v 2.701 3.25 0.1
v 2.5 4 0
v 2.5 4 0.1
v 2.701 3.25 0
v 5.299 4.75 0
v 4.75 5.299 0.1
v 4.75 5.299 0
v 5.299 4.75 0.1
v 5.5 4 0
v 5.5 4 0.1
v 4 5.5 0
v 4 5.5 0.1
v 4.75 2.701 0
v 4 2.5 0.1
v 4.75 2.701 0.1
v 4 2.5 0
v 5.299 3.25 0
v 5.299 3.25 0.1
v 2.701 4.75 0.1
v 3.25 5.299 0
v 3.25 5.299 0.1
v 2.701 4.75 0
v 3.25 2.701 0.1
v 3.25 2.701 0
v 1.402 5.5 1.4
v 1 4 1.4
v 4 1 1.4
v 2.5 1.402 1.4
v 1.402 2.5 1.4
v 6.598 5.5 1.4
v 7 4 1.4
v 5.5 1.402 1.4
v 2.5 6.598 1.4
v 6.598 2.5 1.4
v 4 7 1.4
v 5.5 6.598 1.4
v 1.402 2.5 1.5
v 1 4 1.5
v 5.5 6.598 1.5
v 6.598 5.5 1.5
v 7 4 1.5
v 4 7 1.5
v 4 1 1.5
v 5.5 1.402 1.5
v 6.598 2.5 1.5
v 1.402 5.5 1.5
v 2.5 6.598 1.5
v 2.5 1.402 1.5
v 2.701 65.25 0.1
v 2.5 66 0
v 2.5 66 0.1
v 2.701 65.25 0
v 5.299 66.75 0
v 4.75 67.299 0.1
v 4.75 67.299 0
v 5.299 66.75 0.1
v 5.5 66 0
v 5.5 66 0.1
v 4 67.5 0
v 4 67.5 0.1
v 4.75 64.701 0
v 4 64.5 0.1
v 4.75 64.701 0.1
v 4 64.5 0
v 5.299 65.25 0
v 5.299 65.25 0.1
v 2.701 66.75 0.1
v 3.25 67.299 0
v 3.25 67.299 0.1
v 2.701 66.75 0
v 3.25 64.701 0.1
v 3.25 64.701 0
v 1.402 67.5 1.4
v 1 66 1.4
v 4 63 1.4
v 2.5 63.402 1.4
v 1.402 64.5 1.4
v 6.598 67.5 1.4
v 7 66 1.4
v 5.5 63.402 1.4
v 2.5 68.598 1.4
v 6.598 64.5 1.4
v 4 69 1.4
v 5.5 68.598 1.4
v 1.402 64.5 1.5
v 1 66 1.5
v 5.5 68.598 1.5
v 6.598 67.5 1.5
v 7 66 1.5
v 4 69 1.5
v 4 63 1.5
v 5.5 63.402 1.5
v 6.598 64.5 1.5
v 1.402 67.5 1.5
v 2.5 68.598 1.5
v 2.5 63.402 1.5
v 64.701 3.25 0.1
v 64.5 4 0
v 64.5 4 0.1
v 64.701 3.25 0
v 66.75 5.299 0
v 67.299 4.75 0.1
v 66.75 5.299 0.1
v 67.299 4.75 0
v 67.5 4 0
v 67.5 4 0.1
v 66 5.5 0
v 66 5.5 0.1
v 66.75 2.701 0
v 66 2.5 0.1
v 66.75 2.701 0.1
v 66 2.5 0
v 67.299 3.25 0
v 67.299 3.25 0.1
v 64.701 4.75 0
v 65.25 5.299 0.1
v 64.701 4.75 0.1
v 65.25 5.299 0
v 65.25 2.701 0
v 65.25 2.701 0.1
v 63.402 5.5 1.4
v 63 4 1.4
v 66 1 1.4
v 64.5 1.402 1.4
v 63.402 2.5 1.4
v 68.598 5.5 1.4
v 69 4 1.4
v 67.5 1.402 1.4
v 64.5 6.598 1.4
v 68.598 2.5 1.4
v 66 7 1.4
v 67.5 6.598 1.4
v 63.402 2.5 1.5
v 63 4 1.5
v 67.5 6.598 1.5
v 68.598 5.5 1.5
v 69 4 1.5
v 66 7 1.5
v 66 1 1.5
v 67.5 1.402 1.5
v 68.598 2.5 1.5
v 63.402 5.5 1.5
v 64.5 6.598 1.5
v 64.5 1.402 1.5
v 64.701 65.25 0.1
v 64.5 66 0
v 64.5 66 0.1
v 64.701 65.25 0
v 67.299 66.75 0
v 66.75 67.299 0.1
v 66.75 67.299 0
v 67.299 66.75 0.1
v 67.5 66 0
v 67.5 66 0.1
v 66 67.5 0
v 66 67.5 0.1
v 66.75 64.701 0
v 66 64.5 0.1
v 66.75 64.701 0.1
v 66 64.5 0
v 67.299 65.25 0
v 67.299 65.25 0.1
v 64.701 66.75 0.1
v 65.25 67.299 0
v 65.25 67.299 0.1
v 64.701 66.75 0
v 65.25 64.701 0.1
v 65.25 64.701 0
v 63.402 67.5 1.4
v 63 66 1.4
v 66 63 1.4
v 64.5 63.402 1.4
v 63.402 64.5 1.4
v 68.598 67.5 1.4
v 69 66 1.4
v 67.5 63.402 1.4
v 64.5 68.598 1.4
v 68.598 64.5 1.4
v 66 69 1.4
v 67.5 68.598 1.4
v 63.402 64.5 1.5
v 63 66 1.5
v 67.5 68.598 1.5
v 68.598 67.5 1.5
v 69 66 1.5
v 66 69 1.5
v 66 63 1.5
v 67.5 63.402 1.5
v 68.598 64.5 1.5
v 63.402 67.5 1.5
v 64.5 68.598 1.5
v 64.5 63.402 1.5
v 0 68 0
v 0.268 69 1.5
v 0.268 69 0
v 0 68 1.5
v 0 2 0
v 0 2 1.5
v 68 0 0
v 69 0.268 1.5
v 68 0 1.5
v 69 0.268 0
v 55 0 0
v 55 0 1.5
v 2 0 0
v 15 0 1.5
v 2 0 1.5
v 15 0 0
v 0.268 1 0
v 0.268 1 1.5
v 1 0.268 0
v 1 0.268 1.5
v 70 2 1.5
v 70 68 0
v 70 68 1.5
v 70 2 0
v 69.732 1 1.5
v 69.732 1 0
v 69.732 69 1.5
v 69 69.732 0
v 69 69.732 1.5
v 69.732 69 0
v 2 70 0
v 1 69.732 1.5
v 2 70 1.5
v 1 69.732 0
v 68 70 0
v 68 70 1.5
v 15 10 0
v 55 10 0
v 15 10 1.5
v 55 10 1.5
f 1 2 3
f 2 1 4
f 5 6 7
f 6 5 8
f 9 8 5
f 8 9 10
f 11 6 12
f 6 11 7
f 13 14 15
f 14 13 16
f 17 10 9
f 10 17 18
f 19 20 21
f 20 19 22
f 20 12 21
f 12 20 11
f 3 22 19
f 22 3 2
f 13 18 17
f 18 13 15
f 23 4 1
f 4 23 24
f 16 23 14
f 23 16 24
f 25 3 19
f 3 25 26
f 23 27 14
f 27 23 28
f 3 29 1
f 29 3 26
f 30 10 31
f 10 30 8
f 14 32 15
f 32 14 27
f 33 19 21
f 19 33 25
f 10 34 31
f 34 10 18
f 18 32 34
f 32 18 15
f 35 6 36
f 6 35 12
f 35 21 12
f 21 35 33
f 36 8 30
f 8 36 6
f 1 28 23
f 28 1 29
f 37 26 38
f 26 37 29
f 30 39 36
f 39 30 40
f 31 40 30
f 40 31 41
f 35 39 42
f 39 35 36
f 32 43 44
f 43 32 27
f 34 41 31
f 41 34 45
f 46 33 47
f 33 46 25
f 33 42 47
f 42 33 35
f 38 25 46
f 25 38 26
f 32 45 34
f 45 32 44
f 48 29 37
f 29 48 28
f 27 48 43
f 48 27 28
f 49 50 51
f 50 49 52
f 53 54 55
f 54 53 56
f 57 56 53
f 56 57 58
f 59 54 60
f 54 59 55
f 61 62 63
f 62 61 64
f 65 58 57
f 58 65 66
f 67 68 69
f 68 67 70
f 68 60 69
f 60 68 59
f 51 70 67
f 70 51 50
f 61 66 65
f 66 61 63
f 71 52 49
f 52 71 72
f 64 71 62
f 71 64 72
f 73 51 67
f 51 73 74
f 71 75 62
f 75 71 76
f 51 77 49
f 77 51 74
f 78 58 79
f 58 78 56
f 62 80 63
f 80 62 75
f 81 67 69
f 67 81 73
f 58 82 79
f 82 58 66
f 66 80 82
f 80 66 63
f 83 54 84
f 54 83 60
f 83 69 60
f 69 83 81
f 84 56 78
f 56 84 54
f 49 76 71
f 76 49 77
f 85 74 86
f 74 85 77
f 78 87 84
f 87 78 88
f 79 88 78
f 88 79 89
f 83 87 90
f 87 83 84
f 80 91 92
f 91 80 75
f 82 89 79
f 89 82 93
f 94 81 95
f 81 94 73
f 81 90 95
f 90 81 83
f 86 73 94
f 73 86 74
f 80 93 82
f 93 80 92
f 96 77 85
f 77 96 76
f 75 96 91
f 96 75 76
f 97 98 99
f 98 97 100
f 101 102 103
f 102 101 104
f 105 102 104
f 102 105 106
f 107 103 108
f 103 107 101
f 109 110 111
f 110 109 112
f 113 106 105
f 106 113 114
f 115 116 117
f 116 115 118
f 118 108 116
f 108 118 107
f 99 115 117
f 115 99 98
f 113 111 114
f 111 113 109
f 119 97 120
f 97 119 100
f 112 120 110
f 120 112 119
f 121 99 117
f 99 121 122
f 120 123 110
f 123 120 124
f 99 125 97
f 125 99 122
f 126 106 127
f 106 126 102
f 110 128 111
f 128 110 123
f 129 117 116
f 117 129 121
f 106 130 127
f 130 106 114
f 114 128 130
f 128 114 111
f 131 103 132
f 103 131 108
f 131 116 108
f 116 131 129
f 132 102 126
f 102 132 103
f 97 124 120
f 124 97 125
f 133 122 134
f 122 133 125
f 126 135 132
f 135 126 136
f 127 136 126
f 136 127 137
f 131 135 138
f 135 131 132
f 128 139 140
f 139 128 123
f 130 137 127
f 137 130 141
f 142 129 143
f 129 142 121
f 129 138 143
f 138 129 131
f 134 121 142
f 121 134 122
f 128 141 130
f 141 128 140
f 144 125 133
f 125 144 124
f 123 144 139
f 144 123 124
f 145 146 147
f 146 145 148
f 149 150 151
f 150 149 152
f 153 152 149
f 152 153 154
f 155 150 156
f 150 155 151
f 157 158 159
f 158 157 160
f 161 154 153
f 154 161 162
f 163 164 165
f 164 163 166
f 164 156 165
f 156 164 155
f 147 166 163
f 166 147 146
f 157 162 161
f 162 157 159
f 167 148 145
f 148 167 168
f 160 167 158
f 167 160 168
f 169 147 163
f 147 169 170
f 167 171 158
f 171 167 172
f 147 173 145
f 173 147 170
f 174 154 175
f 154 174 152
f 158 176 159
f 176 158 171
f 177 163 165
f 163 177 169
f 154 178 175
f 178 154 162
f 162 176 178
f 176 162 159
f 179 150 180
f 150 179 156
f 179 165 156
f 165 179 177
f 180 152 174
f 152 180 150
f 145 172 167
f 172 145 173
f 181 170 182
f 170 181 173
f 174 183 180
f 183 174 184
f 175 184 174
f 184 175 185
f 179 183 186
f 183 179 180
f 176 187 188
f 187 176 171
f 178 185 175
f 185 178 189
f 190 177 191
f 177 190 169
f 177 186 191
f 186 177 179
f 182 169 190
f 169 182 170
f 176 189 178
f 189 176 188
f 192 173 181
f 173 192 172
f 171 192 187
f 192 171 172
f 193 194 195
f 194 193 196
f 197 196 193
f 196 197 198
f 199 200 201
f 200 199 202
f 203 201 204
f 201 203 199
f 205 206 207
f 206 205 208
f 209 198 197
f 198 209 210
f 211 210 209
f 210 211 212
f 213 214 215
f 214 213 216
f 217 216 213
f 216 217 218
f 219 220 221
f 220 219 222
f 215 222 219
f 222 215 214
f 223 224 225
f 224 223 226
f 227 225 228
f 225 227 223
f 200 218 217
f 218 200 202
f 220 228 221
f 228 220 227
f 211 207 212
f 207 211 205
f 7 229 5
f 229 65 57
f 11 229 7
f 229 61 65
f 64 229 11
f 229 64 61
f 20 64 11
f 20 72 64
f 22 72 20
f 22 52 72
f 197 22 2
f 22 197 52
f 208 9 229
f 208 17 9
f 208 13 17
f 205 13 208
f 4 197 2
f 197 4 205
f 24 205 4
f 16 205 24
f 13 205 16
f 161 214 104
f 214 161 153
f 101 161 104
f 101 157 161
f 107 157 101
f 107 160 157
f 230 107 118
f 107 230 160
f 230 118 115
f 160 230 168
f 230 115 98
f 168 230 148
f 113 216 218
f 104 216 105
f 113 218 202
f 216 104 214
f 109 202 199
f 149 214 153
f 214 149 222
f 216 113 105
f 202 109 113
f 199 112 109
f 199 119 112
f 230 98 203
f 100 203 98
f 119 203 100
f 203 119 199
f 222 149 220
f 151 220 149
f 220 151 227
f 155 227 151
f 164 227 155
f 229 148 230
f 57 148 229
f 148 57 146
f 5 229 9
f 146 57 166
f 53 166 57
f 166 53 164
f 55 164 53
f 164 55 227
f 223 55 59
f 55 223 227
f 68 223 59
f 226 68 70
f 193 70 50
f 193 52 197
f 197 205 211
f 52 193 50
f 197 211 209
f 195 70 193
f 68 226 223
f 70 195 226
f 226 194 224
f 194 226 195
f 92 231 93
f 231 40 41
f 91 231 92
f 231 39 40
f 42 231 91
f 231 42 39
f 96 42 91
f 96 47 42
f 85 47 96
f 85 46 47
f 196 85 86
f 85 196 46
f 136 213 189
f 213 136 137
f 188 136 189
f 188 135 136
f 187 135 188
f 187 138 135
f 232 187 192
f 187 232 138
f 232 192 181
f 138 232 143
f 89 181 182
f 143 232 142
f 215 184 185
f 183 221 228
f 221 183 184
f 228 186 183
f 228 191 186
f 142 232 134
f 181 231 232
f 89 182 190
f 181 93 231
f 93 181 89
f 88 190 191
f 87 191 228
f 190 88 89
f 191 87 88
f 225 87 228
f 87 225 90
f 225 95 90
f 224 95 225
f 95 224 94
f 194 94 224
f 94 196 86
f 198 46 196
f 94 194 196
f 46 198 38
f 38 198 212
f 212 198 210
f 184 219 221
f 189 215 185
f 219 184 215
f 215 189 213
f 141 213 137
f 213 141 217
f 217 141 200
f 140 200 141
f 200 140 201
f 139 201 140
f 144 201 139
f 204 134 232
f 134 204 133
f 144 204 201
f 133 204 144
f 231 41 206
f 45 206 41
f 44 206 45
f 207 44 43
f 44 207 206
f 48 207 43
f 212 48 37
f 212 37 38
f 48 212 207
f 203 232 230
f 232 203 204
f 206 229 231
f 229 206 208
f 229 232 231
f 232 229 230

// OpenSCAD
// file: logo.scad
// JH logo

thickness = 5;
size = 50;  // total height

module logo_base(thickness, size, radius, line_thickness)
{
	arrow_pos = 0.6;

	//line_thickness = size * 0.15;
	hor_line_thickness = line_thickness;
	//radius = size * 0.25 + line_thickness / 2 / 2;
	
	translate([radius, radius, 0])
	cylinder(r=radius, h=thickness);

	translate([radius, radius, 0])
	cube([radius, radius, thickness]);

	// Horizontal line
	translate([2*radius - 1, 2*radius - line_thickness, 0])
	cube([size * arrow_pos + 1, line_thickness, thickness]);

	// triangle
	/*translate([2*radius + size*arrow_pos, size/2-1.5*line_thickness, 0])
	linear_extrude(height = thickness)
	polygon(points=[[0,0],[2*line_thickness, 1.5*line_thickness],[0,3*line_thickness]], paths=[[0,1,2]]);
	*/

	// Top part of J
	translate([2*radius - hor_line_thickness, 2*radius - 1, 0])
	cube([hor_line_thickness, size - (2*radius) + 1, thickness]);

	// Right part of H
	translate([2*radius + size*0.2, 0, 0])
	cube([hor_line_thickness, size, thickness]);
}

module logo(thickness, size)
{
	line_thickness = size * 0.18;
	radius = size * 0.25 + line_thickness / 2 / 2;
	inner_radius = radius - line_thickness;
	difference() {
		logo_base(thickness, size, radius, line_thickness);
		translate([radius, radius, -1])
			cylinder(r=inner_radius, h=thickness+2);
		translate([radius, radius, -1])
			cube([inner_radius, inner_radius, thickness+2]);
	}
}

minkowski()
{
	logo(thickness, size);
	//sphere(r=3);
}
// main file
use <logo.scad>;

$fn = 12;

SIDE_THICKNESS = 2;
FRONT_THICKNESS = 0.5;
BACK_THICKNESS = 1.5;
DEPTH = 40;

INNER_WIDTH = 66;
OUTER_WIDTH = INNER_WIDTH + 2*SIDE_THICKNESS;
INNER_HEIGHT = 66;
OUTER_HEIGHT = INNER_HEIGHT + 2*SIDE_THICKNESS;

ROUNDING_R = 2;

HOLDER_OUTER_R = 4;
HOLDER_INNER_R = 1.3;
HOLDER_H = 10;

module rounded_cube(x, y, z, r) {
    translate([r,r,0])
    minkowski() {
        cube([x-2*r, y-2*r, 1]);
        cylinder(r=r, h=z-1);
    }
}

module tapped_hole(h1, h2, r1, r2) {
    cylinder(r=r1, h=h1);
    translate([0,0,h1-0.1])
    cylinder(r1=r1, r2=r2, h=h2);
    translate([0,0,h1+h2-0.1])
    cylinder(r=r2, h=10);
}

module base() {
union() {
difference() {
    rounded_cube(OUTER_WIDTH, OUTER_HEIGHT, DEPTH, ROUNDING_R);
    
    translate([SIDE_THICKNESS, SIDE_THICKNESS, FRONT_THICKNESS])
    cube([INNER_WIDTH, INNER_HEIGHT, DEPTH]);
    
    translate([OUTER_WIDTH/2-20, 60, 10])
    cube([40, 50, DEPTH]);

    translate([OUTER_WIDTH - 0.5, OUTER_HEIGHT/2-10, 33])
    rotate([0,90,0])
    logo(5, 20);
}

    translate([2-0.5, OUTER_HEIGHT/2-10, 8])
    rotate([0,-90,0])
    logo(2, 20);

    difference() {
        hull() {
            translate([SIDE_THICKNESS-0.1, SIDE_THICKNESS-0.1, 25])
            cylinder(r=0.1, h=1);
            translate([HOLDER_OUTER_R, HOLDER_OUTER_R, DEPTH-HOLDER_H-0.5])
            cylinder(r=HOLDER_OUTER_R, h=HOLDER_H);
        }
        translate([HOLDER_OUTER_R, HOLDER_OUTER_R, DEPTH-HOLDER_H])
        cylinder(r=HOLDER_INNER_R, h=100);
    }
    difference() {
        hull() {
            translate([OUTER_WIDTH-SIDE_THICKNESS+0.1, SIDE_THICKNESS-0.1, 25])
            cylinder(r=0.1, h=1);
            translate([OUTER_WIDTH-HOLDER_OUTER_R, HOLDER_OUTER_R, DEPTH-HOLDER_H-0.5])
            cylinder(r=HOLDER_OUTER_R, h=HOLDER_H);
        }
        translate([OUTER_WIDTH-HOLDER_OUTER_R, HOLDER_OUTER_R, DEPTH-HOLDER_H])
        cylinder(r=HOLDER_INNER_R, h=100);
    }
    difference() {
        hull() {
            translate([SIDE_THICKNESS-0.1, OUTER_HEIGHT-SIDE_THICKNESS+0.1, 25])
            cylinder(r=0.1, h=1);
            translate([HOLDER_OUTER_R, OUTER_HEIGHT-HOLDER_OUTER_R, DEPTH-HOLDER_H-0.5])
            cylinder(r=HOLDER_OUTER_R, h=HOLDER_H);
        }
        translate([HOLDER_OUTER_R, OUTER_HEIGHT-HOLDER_OUTER_R, DEPTH-HOLDER_H])
        cylinder(r=HOLDER_INNER_R, h=100);
    }
    difference() {
        hull() {
            translate([OUTER_HEIGHT-SIDE_THICKNESS+0.1, OUTER_HEIGHT-SIDE_THICKNESS+0.1, 25])
            cylinder(r=0.1, h=1);
            translate([OUTER_WIDTH-HOLDER_OUTER_R, OUTER_HEIGHT-HOLDER_OUTER_R, DEPTH-HOLDER_H-0.5])
            cylinder(r=HOLDER_OUTER_R, h=HOLDER_H);
        }
        translate([OUTER_WIDTH-HOLDER_OUTER_R, OUTER_HEIGHT-HOLDER_OUTER_R, DEPTH-HOLDER_H])
        cylinder(r=HOLDER_INNER_R, h=100);
    }
    
}
}

SCREW_R1 = 1.5;
SCREW_R2 = 3;

module back() {
   difference() {
        rounded_cube(OUTER_WIDTH, OUTER_HEIGHT, BACK_THICKNESS, ROUNDING_R);
       
       translate([OUTER_WIDTH/2-20, -1, -1])
       cube([40, 11, 10]);
            
       translate([HOLDER_OUTER_R, HOLDER_OUTER_R, -1])
       tapped_hole(r1=SCREW_R1, r2=SCREW_R2, h1=1.2, h2=1.3);

       translate([HOLDER_OUTER_R, OUTER_HEIGHT-HOLDER_OUTER_R, -1])
       tapped_hole(r1=SCREW_R1, r2=SCREW_R2, h1=1.2, h2=1.3);

       translate([OUTER_WIDTH-HOLDER_OUTER_R, HOLDER_OUTER_R, -1])
       tapped_hole(r1=SCREW_R1, r2=SCREW_R2, h1=1.2, h2=1.3);

       translate([OUTER_WIDTH-HOLDER_OUTER_R, OUTER_HEIGHT-HOLDER_OUTER_R, -1])
       tapped_hole(r1=SCREW_R1, r2=SCREW_R2, h1=1.2, h2=1.3);

   }
}

//base();
back();
